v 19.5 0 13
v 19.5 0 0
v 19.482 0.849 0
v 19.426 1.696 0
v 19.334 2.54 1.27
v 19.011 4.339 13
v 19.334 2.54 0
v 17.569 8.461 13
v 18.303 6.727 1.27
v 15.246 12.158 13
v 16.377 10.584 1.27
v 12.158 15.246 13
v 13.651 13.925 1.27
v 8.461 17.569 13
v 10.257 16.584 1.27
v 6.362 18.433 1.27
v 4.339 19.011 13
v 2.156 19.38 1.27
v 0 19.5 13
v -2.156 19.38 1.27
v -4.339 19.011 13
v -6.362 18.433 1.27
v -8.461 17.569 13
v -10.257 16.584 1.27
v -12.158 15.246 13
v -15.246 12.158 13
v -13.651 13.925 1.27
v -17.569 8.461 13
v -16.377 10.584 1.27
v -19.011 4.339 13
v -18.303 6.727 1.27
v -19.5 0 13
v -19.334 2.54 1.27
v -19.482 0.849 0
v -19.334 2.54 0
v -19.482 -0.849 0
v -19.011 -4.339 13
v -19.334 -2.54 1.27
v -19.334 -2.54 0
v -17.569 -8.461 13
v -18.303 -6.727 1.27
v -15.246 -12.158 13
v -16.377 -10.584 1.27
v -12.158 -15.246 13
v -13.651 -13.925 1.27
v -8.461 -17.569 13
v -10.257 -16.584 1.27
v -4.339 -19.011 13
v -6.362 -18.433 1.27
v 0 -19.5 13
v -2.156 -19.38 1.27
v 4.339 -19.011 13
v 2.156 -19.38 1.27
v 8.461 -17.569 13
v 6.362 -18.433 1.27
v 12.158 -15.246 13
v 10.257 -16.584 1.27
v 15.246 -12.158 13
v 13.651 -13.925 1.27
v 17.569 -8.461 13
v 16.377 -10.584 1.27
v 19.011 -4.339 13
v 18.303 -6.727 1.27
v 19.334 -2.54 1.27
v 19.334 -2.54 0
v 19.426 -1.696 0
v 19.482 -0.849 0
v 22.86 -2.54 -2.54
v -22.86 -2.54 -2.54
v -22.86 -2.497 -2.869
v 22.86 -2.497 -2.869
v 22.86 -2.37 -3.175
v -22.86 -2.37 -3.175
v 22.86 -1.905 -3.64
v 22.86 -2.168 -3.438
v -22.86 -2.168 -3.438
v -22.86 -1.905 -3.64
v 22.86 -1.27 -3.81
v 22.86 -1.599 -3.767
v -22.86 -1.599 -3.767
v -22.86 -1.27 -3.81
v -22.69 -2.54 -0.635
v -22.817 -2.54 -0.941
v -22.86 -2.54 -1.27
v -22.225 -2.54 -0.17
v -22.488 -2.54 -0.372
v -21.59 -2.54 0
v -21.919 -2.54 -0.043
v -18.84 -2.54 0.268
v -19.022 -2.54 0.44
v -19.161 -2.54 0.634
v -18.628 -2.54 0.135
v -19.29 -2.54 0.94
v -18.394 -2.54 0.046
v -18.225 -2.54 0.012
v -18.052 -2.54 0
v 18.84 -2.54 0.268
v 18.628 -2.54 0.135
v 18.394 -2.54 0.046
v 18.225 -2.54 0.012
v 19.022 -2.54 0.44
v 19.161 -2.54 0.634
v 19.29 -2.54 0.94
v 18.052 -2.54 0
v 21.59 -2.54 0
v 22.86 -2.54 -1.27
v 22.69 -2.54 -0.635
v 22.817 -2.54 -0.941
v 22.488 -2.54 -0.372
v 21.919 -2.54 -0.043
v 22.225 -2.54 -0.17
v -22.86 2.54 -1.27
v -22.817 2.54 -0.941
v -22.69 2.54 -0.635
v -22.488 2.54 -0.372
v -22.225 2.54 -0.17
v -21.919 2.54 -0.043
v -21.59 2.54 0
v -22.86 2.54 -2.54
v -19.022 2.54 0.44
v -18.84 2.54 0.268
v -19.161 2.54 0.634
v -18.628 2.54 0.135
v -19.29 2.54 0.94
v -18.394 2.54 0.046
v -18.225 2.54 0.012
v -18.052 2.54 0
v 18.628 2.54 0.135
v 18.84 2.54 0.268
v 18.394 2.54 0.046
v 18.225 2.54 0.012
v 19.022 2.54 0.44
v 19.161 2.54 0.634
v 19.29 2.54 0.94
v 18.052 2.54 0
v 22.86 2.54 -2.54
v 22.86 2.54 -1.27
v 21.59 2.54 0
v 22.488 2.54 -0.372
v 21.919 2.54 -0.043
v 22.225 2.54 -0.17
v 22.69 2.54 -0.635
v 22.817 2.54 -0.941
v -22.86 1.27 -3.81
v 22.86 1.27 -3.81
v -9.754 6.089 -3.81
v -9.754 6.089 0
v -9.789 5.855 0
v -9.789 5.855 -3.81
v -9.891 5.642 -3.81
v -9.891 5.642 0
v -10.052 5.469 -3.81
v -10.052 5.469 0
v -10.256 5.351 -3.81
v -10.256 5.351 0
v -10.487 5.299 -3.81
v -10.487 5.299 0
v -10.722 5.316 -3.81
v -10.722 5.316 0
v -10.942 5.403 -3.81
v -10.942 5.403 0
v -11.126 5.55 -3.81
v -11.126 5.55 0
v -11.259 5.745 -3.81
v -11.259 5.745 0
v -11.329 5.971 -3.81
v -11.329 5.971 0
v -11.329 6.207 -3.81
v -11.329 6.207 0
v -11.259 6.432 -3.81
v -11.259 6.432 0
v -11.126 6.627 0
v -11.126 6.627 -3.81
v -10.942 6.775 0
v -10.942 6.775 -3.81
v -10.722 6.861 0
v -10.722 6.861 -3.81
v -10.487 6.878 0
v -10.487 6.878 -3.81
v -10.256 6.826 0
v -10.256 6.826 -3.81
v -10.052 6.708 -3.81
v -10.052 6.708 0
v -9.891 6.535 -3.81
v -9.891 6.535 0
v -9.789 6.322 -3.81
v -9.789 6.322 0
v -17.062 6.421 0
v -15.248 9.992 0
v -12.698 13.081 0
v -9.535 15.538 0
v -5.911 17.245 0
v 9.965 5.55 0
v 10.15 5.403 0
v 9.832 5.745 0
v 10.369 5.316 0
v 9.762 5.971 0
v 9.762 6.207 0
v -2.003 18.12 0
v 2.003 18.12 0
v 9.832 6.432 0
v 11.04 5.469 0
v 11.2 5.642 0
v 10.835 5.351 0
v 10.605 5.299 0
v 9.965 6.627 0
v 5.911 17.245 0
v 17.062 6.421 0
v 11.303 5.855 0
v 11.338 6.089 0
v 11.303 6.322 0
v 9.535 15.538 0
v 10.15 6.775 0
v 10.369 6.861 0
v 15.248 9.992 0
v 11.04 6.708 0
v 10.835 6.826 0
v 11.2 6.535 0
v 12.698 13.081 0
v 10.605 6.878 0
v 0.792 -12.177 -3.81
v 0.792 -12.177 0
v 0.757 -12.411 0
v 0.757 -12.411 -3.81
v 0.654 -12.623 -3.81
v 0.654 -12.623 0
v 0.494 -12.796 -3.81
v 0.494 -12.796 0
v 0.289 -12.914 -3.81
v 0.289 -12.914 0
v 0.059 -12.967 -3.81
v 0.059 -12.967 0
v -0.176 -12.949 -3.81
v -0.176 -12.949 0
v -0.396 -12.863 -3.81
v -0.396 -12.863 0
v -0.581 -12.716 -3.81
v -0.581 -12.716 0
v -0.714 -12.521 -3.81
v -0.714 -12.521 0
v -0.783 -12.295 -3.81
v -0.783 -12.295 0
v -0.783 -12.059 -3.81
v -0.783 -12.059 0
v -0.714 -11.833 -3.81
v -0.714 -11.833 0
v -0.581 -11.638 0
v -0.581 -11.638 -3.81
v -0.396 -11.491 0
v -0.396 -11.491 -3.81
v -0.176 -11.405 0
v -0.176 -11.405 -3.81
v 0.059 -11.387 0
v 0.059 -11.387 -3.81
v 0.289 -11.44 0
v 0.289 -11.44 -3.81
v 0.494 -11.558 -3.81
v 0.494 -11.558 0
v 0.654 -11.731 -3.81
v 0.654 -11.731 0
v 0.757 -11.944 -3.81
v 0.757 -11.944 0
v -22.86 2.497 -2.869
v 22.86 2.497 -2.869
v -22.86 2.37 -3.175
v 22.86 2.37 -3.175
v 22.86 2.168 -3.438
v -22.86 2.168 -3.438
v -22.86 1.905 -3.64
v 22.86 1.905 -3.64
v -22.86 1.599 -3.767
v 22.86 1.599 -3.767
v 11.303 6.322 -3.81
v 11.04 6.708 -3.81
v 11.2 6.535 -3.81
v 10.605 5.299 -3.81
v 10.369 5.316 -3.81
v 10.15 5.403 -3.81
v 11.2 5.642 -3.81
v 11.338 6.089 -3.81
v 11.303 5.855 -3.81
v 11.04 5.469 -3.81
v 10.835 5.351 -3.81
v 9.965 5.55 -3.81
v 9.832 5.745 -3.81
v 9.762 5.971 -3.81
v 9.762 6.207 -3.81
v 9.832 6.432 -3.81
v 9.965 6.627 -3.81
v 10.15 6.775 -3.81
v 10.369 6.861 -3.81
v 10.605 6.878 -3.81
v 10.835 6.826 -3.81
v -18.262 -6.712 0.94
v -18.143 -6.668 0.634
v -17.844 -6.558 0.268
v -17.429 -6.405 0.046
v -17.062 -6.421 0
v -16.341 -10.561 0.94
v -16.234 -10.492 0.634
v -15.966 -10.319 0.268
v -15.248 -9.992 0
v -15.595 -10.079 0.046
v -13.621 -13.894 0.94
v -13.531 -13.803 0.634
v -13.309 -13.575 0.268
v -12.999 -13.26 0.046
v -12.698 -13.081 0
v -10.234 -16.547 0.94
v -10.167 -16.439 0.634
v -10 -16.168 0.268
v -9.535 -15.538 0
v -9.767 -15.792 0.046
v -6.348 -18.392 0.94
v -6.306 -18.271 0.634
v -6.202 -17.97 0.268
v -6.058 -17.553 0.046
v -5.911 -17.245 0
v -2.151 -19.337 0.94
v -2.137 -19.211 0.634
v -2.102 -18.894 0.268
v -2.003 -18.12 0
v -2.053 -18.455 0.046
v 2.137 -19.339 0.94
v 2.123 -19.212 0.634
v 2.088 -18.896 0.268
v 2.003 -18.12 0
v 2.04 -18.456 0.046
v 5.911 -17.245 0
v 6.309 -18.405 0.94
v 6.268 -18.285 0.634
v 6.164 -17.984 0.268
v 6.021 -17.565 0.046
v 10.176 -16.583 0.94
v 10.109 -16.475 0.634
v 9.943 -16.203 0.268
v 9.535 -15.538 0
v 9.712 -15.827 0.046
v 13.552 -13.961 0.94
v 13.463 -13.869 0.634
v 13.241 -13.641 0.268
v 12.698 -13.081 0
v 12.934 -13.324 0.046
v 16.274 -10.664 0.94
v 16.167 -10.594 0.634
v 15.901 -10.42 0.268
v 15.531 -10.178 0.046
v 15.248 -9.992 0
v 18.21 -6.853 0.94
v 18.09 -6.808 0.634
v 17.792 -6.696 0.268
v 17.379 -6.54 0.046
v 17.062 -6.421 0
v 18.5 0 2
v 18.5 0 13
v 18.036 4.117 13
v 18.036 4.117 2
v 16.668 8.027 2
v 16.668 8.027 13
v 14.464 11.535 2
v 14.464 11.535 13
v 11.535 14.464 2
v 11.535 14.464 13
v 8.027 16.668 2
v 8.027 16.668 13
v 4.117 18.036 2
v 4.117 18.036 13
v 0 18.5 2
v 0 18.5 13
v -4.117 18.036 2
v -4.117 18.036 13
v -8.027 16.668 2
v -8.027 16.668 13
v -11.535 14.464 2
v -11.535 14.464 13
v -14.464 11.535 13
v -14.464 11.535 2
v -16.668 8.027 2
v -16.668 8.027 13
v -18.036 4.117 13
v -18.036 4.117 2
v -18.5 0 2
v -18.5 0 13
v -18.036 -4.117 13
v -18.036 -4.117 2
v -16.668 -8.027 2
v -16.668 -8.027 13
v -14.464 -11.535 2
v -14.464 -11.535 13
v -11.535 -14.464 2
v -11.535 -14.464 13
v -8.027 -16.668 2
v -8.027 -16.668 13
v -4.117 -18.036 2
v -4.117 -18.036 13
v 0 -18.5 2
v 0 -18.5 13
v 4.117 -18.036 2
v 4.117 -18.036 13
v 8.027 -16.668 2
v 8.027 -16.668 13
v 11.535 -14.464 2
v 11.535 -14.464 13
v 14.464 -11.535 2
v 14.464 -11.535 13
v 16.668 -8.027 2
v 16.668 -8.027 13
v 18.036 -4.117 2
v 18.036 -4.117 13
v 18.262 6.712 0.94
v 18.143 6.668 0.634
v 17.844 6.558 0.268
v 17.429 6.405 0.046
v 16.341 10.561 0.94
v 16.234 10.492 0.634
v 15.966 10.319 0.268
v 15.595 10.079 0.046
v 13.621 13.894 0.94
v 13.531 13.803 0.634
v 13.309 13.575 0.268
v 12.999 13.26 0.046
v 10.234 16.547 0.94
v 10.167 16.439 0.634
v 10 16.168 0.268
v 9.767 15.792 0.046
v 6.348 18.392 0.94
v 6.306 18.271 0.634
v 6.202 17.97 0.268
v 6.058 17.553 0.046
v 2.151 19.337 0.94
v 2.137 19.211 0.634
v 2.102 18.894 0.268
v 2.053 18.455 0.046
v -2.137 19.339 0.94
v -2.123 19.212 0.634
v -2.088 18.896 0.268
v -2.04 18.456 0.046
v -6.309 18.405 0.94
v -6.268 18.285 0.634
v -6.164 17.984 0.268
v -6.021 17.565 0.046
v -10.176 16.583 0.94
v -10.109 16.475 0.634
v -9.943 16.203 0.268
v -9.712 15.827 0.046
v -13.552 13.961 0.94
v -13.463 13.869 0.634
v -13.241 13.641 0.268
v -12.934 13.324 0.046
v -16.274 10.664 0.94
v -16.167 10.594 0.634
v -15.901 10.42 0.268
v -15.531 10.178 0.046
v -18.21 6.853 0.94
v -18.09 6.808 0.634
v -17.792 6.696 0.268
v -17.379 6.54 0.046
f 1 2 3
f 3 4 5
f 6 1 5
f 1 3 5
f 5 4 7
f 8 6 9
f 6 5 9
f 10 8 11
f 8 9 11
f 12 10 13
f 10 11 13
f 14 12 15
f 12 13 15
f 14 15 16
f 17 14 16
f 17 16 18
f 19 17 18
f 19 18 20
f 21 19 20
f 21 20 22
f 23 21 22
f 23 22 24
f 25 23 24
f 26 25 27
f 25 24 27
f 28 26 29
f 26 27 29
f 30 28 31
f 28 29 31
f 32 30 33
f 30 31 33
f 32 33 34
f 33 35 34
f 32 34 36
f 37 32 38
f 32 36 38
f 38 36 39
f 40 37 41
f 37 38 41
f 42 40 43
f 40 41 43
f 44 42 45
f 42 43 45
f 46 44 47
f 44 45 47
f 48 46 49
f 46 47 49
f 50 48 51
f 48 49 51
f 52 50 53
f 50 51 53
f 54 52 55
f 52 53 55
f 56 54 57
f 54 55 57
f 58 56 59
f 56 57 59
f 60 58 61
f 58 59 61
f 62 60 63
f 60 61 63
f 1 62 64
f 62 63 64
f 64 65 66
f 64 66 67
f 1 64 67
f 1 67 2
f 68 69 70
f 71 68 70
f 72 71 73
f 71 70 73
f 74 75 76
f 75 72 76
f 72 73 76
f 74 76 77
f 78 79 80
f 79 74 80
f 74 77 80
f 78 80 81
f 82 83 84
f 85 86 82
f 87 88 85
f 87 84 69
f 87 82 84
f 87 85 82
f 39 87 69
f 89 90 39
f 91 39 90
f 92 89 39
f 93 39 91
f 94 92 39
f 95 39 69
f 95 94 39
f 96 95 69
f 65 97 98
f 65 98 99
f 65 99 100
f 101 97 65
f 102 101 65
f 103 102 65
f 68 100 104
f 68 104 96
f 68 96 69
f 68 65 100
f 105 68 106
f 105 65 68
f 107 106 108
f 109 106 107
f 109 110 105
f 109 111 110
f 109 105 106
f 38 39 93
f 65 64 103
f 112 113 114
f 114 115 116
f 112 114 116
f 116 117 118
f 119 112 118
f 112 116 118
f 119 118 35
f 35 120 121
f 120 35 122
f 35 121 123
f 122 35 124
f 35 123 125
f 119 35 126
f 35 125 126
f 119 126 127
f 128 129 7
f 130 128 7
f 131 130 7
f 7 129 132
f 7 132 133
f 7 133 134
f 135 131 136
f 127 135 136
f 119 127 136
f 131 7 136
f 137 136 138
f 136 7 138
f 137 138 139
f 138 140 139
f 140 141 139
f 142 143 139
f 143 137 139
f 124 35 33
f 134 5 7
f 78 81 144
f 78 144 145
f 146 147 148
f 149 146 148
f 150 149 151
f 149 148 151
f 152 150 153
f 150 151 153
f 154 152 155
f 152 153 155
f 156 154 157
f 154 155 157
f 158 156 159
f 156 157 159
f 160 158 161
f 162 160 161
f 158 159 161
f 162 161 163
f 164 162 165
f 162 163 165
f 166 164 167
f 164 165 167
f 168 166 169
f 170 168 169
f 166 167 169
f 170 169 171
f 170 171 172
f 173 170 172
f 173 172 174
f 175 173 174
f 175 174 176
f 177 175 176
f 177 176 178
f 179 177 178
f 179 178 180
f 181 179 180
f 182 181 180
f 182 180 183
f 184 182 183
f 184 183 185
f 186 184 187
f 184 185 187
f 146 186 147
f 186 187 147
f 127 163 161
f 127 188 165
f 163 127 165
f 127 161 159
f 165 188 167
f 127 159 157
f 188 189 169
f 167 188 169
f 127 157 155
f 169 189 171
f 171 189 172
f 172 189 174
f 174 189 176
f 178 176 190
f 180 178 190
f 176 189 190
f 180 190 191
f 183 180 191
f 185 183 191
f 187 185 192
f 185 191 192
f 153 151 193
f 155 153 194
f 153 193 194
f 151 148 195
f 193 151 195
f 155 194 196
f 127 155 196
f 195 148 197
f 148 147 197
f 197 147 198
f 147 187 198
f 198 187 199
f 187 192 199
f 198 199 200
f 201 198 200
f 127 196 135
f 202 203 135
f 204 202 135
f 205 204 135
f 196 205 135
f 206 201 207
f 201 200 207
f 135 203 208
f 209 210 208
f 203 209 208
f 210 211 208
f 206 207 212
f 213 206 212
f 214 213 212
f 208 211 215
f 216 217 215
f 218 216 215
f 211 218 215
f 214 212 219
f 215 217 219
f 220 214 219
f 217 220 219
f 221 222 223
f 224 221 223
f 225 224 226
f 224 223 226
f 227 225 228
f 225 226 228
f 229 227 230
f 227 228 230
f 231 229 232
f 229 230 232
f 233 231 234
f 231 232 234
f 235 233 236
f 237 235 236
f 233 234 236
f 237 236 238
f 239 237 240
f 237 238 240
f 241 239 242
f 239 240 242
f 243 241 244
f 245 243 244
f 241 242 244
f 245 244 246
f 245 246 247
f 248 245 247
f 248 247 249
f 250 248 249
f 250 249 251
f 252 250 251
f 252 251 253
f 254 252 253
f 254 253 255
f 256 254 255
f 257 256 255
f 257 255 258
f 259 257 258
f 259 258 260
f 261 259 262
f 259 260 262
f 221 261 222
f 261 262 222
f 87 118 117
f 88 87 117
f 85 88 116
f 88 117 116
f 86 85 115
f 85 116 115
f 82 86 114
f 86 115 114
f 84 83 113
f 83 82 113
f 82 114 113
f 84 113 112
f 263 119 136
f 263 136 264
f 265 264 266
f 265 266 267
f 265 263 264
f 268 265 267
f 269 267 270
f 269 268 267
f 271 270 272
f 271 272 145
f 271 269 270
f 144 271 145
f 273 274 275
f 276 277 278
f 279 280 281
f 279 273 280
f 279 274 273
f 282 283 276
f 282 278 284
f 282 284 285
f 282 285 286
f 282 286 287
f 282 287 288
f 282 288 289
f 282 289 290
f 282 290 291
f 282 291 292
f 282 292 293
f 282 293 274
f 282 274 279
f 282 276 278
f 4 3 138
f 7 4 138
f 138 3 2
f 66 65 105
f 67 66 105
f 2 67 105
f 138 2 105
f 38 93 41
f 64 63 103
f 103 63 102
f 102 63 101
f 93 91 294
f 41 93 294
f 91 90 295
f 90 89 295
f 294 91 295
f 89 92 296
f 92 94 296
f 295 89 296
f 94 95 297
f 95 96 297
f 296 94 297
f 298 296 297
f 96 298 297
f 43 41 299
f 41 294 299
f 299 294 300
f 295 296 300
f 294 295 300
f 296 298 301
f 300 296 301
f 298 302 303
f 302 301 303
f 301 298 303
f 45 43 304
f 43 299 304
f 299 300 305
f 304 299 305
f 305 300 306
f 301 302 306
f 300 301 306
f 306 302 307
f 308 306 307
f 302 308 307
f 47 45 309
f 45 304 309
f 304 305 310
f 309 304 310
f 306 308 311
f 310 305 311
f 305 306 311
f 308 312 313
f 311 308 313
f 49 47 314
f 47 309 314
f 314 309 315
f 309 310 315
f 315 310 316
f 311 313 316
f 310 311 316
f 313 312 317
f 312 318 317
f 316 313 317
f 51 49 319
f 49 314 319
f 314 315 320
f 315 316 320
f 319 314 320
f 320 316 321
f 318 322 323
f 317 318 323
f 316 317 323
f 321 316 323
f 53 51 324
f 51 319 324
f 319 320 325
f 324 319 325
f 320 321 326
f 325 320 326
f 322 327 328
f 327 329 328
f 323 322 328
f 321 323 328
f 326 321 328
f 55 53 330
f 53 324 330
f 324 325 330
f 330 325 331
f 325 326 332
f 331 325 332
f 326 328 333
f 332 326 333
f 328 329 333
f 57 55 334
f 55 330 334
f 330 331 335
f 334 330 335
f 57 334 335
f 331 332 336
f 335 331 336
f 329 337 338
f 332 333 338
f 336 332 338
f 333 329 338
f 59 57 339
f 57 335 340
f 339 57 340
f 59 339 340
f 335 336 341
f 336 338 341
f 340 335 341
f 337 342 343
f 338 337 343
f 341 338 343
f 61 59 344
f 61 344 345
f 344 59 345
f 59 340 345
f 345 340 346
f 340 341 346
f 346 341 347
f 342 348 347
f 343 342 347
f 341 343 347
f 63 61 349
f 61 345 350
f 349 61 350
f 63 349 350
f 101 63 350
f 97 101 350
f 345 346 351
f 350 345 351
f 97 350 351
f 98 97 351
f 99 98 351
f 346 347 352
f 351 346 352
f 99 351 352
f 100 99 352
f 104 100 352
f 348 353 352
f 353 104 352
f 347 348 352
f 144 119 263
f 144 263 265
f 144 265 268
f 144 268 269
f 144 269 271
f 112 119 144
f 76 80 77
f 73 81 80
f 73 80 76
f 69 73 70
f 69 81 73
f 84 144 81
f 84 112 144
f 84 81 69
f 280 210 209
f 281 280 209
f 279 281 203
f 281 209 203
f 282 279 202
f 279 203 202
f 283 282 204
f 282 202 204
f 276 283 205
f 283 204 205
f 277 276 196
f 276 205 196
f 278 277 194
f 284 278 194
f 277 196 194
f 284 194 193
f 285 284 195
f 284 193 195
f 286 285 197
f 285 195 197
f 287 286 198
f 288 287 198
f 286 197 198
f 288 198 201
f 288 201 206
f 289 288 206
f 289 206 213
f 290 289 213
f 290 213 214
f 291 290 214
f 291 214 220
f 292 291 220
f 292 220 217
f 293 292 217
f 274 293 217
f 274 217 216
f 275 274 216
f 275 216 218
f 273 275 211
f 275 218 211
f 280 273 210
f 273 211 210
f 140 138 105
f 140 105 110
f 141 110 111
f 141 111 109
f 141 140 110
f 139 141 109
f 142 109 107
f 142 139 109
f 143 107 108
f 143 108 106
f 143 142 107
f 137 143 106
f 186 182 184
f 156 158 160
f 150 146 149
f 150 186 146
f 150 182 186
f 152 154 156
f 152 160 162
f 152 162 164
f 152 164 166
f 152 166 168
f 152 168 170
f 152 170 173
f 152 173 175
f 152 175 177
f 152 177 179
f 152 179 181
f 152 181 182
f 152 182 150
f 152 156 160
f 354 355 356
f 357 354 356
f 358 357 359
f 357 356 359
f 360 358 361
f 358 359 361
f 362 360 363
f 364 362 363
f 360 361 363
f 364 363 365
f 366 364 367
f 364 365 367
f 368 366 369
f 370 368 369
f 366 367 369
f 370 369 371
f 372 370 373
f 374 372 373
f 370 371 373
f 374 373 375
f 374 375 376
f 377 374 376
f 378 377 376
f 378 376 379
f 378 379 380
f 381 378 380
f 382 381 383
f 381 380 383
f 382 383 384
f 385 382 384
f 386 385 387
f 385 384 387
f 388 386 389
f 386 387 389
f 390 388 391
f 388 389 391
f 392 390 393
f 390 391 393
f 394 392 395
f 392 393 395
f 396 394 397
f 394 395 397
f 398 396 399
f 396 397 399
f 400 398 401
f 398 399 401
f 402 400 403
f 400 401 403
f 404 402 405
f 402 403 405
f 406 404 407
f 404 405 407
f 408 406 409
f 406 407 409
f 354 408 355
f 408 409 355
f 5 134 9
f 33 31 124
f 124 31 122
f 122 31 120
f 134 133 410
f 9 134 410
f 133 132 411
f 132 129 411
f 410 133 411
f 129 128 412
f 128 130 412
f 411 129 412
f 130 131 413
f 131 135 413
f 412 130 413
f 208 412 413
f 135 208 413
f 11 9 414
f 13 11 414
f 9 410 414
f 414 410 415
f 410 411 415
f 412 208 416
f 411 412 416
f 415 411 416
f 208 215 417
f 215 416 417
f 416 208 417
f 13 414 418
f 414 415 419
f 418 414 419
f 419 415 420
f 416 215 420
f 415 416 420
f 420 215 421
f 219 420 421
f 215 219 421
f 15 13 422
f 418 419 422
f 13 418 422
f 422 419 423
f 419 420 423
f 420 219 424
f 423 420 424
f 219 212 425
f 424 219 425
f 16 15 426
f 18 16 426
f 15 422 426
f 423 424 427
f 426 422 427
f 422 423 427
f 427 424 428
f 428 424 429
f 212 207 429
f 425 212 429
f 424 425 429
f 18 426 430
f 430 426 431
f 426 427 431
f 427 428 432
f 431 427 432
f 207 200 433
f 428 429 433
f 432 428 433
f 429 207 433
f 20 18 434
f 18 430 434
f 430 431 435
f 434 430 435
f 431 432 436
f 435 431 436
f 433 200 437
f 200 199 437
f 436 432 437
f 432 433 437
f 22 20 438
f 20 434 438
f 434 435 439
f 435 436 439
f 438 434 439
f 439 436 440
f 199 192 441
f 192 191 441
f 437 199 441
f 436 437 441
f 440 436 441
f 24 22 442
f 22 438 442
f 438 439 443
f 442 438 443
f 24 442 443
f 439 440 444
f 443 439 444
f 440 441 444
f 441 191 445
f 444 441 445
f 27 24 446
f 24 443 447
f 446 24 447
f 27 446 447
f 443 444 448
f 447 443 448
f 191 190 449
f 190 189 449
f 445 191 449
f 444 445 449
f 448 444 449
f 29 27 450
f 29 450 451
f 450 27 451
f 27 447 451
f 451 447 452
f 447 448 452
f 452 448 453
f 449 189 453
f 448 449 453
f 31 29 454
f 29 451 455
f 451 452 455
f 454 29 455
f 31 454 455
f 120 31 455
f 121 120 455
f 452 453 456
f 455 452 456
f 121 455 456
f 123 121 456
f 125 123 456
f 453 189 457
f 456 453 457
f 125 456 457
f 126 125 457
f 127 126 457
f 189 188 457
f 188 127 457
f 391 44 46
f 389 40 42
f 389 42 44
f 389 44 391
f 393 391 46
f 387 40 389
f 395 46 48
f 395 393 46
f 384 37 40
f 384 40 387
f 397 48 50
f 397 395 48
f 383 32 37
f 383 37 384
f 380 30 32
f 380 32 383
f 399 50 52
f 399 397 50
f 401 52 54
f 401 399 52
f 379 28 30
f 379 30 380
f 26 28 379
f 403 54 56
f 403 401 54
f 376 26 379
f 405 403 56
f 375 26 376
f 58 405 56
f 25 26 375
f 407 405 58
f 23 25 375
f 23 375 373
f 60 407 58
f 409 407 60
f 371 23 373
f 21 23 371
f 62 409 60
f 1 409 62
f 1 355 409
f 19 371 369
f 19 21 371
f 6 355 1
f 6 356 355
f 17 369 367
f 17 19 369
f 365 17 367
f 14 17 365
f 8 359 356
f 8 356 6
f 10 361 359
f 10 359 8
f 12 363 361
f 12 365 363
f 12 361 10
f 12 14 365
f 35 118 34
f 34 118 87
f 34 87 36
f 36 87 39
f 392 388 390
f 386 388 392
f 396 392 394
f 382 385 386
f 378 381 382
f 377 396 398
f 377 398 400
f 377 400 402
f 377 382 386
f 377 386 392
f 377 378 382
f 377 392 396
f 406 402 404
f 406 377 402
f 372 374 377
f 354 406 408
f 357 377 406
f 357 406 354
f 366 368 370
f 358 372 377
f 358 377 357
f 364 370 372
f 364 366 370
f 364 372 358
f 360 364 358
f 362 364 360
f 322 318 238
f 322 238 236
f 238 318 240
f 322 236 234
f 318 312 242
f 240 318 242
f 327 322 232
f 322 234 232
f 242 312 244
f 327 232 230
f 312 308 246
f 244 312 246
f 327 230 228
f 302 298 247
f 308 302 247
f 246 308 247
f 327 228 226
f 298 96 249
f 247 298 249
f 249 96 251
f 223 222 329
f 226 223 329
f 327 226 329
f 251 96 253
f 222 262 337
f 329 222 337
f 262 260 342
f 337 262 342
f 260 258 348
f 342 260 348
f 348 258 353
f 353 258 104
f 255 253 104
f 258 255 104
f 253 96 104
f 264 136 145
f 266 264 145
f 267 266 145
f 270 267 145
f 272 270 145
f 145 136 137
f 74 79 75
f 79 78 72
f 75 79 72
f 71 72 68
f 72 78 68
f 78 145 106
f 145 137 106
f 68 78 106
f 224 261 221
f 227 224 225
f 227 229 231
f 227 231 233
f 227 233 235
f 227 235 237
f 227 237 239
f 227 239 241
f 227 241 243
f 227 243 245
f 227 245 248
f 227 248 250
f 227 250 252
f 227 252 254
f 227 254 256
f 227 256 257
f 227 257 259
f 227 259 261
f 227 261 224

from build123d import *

# Parameters (mm, degrees)
F0_R         = 19.5
F1_DEPTH     = 13
F2_R         = 18.5
F3_DEPTH     = 11
F4_W         = 45.72
F4_H         = 5.08
F5_DEPTH     = 3.81
F6_T1_DEPTH  = 52.07
F6_T3_DEPTH  = 11.43
F6_T8_ANGLE  = 183.7142551891
F6_T13_ANGLE = 183.7142551891
F7_R         = 0.7920917612
F8_DEPTH     = 3.81


# Not quite as in the source:
# - a fillet or chamfer that OpenCascade refuses, or shapes differently, is made with other operations: its cross-section is extruded or revolved along the edge and cut away or added


with BuildPart() as f1:
    # F0 (on Top) → F1 (new body)
    with BuildSketch(Plane.XY):
        Circle(F0_R)
    extrude(amount=F1_DEPTH)

    # F2 (on face) → F3 (cut)
    with BuildSketch(Plane.XY.offset(13)):
        Circle(F2_R)
    extrude(amount=-F3_DEPTH, mode=Mode.SUBTRACT)

    # F4 (on face) → F5 (join)
    with BuildSketch(Plane(origin=(0, 0, 0), x_dir=(1, 0, 0), z_dir=(0, 0, -1))):
        Rectangle(F4_W, F4_H)
    extrude(amount=F5_DEPTH)

    # F6: fillet of radius 1.27 on 6 edges, made by hand

    # F6_s2 → F6_t1 (cut)
    with BuildSketch(Plane.YZ.offset(-26.035)):
        with BuildLine():
            ThreePointArc((-2.54, -2.54), (-2.1680256121, -3.4380256121), (-1.27, -3.81))
            Line((-1.27, -3.81), (-2.54, -3.81))
            Line((-2.54, -3.81), (-2.54, -2.54))
        make_face()
        with BuildLine():
            ThreePointArc((2.54, -2.54), (2.1680256121, -3.4380256121), (1.27, -3.81))
            Line((1.27, -3.81), (2.54, -3.81))
            Line((2.54, -3.81), (2.54, -2.54))
        make_face()
    extrude(amount=F6_T1_DEPTH, mode=Mode.SUBTRACT)

    # F6_s4 → F6_t3 (cut)
    with BuildSketch(Plane.XZ.offset(-5.715)):
        with BuildLine():
            ThreePointArc((-21.59, 0), (-22.4880256121, -0.3719743879), (-22.86, -1.27))
            Line((-22.86, -1.27), (-22.86, 0))
            Line((-22.86, 0), (-21.59, 0))
        make_face()
        with BuildLine():
            ThreePointArc((21.59, 0), (22.4880256121, -0.3719743879), (22.86, -1.27))
            Line((22.86, -1.27), (22.86, 0))
            Line((22.86, 0), (21.59, 0))
        make_face()
    extrude(amount=F6_T3_DEPTH, mode=Mode.SUBTRACT)


with BuildPart() as f6_tool6:
    # F6_s7 → F6_t8 (revolve)
    with BuildSketch(Plane(origin=(0, 0, 0), x_dir=(0, 0, 1), z_dir=(-0.0324073159, -0.999474745, 0))):
        with BuildLine():
            ThreePointArc((1.27, -19.5), (0.3719743879, -19.1280256121), (0, -18.23))
            Line((0, -18.23), (0, -19.5))
            Line((0, -19.5), (1.27, -19.5))
        make_face()
    revolve(axis=Axis((0, 0, 0), (0, 0, 1)), revolution_arc=F6_T8_ANGLE)

    split(bisect_by=Plane.XZ.offset(-2.54), keep=Keep.BOTTOM)


with BuildPart() as f1_1:
    add(f1.part)

    # F6_t5: cut F6_tool6
    add(f6_tool6.part, mode=Mode.SUBTRACT)


with BuildPart() as f6_tool11:
    # F6_s12 → F6_t13 (revolve)
    with BuildSketch(Plane(origin=(0, 0, 0), x_dir=(0, 0, 1), z_dir=(0.0324073159, 0.999474745, 0))):
        with BuildLine():
            ThreePointArc((1.27, -19.5), (0.3719743879, -19.1280256121), (0, -18.23))
            Line((0, -18.23), (0, -19.5))
            Line((0, -19.5), (1.27, -19.5))
        make_face()
    revolve(axis=Axis((0, 0, 0), (0, 0, 1)), revolution_arc=F6_T13_ANGLE)

    split(bisect_by=Plane.XZ.offset(2.54), keep=Keep.TOP)


with BuildPart() as f1_2:
    add(f1_1.part)

    # F6_t10: cut F6_tool11
    add(f6_tool11.part, mode=Mode.SUBTRACT)

    # F7 (on face) → F8 (join, through all)
    with BuildSketch(Plane(origin=(0, 0, 0), x_dir=(1, 0, 0), z_dir=(0, 0, -1))):
        with Locations((10.5457008786, -6.0885632411)):
            Circle(F7_R)
        with Locations((-10.5457008786, -6.0885632411)):
            Circle(F7_R)
        with Locations((0, 12.1771264821)):
            Circle(F7_R)
    extrude(amount=F8_DEPTH)


solid = f1_2.part
